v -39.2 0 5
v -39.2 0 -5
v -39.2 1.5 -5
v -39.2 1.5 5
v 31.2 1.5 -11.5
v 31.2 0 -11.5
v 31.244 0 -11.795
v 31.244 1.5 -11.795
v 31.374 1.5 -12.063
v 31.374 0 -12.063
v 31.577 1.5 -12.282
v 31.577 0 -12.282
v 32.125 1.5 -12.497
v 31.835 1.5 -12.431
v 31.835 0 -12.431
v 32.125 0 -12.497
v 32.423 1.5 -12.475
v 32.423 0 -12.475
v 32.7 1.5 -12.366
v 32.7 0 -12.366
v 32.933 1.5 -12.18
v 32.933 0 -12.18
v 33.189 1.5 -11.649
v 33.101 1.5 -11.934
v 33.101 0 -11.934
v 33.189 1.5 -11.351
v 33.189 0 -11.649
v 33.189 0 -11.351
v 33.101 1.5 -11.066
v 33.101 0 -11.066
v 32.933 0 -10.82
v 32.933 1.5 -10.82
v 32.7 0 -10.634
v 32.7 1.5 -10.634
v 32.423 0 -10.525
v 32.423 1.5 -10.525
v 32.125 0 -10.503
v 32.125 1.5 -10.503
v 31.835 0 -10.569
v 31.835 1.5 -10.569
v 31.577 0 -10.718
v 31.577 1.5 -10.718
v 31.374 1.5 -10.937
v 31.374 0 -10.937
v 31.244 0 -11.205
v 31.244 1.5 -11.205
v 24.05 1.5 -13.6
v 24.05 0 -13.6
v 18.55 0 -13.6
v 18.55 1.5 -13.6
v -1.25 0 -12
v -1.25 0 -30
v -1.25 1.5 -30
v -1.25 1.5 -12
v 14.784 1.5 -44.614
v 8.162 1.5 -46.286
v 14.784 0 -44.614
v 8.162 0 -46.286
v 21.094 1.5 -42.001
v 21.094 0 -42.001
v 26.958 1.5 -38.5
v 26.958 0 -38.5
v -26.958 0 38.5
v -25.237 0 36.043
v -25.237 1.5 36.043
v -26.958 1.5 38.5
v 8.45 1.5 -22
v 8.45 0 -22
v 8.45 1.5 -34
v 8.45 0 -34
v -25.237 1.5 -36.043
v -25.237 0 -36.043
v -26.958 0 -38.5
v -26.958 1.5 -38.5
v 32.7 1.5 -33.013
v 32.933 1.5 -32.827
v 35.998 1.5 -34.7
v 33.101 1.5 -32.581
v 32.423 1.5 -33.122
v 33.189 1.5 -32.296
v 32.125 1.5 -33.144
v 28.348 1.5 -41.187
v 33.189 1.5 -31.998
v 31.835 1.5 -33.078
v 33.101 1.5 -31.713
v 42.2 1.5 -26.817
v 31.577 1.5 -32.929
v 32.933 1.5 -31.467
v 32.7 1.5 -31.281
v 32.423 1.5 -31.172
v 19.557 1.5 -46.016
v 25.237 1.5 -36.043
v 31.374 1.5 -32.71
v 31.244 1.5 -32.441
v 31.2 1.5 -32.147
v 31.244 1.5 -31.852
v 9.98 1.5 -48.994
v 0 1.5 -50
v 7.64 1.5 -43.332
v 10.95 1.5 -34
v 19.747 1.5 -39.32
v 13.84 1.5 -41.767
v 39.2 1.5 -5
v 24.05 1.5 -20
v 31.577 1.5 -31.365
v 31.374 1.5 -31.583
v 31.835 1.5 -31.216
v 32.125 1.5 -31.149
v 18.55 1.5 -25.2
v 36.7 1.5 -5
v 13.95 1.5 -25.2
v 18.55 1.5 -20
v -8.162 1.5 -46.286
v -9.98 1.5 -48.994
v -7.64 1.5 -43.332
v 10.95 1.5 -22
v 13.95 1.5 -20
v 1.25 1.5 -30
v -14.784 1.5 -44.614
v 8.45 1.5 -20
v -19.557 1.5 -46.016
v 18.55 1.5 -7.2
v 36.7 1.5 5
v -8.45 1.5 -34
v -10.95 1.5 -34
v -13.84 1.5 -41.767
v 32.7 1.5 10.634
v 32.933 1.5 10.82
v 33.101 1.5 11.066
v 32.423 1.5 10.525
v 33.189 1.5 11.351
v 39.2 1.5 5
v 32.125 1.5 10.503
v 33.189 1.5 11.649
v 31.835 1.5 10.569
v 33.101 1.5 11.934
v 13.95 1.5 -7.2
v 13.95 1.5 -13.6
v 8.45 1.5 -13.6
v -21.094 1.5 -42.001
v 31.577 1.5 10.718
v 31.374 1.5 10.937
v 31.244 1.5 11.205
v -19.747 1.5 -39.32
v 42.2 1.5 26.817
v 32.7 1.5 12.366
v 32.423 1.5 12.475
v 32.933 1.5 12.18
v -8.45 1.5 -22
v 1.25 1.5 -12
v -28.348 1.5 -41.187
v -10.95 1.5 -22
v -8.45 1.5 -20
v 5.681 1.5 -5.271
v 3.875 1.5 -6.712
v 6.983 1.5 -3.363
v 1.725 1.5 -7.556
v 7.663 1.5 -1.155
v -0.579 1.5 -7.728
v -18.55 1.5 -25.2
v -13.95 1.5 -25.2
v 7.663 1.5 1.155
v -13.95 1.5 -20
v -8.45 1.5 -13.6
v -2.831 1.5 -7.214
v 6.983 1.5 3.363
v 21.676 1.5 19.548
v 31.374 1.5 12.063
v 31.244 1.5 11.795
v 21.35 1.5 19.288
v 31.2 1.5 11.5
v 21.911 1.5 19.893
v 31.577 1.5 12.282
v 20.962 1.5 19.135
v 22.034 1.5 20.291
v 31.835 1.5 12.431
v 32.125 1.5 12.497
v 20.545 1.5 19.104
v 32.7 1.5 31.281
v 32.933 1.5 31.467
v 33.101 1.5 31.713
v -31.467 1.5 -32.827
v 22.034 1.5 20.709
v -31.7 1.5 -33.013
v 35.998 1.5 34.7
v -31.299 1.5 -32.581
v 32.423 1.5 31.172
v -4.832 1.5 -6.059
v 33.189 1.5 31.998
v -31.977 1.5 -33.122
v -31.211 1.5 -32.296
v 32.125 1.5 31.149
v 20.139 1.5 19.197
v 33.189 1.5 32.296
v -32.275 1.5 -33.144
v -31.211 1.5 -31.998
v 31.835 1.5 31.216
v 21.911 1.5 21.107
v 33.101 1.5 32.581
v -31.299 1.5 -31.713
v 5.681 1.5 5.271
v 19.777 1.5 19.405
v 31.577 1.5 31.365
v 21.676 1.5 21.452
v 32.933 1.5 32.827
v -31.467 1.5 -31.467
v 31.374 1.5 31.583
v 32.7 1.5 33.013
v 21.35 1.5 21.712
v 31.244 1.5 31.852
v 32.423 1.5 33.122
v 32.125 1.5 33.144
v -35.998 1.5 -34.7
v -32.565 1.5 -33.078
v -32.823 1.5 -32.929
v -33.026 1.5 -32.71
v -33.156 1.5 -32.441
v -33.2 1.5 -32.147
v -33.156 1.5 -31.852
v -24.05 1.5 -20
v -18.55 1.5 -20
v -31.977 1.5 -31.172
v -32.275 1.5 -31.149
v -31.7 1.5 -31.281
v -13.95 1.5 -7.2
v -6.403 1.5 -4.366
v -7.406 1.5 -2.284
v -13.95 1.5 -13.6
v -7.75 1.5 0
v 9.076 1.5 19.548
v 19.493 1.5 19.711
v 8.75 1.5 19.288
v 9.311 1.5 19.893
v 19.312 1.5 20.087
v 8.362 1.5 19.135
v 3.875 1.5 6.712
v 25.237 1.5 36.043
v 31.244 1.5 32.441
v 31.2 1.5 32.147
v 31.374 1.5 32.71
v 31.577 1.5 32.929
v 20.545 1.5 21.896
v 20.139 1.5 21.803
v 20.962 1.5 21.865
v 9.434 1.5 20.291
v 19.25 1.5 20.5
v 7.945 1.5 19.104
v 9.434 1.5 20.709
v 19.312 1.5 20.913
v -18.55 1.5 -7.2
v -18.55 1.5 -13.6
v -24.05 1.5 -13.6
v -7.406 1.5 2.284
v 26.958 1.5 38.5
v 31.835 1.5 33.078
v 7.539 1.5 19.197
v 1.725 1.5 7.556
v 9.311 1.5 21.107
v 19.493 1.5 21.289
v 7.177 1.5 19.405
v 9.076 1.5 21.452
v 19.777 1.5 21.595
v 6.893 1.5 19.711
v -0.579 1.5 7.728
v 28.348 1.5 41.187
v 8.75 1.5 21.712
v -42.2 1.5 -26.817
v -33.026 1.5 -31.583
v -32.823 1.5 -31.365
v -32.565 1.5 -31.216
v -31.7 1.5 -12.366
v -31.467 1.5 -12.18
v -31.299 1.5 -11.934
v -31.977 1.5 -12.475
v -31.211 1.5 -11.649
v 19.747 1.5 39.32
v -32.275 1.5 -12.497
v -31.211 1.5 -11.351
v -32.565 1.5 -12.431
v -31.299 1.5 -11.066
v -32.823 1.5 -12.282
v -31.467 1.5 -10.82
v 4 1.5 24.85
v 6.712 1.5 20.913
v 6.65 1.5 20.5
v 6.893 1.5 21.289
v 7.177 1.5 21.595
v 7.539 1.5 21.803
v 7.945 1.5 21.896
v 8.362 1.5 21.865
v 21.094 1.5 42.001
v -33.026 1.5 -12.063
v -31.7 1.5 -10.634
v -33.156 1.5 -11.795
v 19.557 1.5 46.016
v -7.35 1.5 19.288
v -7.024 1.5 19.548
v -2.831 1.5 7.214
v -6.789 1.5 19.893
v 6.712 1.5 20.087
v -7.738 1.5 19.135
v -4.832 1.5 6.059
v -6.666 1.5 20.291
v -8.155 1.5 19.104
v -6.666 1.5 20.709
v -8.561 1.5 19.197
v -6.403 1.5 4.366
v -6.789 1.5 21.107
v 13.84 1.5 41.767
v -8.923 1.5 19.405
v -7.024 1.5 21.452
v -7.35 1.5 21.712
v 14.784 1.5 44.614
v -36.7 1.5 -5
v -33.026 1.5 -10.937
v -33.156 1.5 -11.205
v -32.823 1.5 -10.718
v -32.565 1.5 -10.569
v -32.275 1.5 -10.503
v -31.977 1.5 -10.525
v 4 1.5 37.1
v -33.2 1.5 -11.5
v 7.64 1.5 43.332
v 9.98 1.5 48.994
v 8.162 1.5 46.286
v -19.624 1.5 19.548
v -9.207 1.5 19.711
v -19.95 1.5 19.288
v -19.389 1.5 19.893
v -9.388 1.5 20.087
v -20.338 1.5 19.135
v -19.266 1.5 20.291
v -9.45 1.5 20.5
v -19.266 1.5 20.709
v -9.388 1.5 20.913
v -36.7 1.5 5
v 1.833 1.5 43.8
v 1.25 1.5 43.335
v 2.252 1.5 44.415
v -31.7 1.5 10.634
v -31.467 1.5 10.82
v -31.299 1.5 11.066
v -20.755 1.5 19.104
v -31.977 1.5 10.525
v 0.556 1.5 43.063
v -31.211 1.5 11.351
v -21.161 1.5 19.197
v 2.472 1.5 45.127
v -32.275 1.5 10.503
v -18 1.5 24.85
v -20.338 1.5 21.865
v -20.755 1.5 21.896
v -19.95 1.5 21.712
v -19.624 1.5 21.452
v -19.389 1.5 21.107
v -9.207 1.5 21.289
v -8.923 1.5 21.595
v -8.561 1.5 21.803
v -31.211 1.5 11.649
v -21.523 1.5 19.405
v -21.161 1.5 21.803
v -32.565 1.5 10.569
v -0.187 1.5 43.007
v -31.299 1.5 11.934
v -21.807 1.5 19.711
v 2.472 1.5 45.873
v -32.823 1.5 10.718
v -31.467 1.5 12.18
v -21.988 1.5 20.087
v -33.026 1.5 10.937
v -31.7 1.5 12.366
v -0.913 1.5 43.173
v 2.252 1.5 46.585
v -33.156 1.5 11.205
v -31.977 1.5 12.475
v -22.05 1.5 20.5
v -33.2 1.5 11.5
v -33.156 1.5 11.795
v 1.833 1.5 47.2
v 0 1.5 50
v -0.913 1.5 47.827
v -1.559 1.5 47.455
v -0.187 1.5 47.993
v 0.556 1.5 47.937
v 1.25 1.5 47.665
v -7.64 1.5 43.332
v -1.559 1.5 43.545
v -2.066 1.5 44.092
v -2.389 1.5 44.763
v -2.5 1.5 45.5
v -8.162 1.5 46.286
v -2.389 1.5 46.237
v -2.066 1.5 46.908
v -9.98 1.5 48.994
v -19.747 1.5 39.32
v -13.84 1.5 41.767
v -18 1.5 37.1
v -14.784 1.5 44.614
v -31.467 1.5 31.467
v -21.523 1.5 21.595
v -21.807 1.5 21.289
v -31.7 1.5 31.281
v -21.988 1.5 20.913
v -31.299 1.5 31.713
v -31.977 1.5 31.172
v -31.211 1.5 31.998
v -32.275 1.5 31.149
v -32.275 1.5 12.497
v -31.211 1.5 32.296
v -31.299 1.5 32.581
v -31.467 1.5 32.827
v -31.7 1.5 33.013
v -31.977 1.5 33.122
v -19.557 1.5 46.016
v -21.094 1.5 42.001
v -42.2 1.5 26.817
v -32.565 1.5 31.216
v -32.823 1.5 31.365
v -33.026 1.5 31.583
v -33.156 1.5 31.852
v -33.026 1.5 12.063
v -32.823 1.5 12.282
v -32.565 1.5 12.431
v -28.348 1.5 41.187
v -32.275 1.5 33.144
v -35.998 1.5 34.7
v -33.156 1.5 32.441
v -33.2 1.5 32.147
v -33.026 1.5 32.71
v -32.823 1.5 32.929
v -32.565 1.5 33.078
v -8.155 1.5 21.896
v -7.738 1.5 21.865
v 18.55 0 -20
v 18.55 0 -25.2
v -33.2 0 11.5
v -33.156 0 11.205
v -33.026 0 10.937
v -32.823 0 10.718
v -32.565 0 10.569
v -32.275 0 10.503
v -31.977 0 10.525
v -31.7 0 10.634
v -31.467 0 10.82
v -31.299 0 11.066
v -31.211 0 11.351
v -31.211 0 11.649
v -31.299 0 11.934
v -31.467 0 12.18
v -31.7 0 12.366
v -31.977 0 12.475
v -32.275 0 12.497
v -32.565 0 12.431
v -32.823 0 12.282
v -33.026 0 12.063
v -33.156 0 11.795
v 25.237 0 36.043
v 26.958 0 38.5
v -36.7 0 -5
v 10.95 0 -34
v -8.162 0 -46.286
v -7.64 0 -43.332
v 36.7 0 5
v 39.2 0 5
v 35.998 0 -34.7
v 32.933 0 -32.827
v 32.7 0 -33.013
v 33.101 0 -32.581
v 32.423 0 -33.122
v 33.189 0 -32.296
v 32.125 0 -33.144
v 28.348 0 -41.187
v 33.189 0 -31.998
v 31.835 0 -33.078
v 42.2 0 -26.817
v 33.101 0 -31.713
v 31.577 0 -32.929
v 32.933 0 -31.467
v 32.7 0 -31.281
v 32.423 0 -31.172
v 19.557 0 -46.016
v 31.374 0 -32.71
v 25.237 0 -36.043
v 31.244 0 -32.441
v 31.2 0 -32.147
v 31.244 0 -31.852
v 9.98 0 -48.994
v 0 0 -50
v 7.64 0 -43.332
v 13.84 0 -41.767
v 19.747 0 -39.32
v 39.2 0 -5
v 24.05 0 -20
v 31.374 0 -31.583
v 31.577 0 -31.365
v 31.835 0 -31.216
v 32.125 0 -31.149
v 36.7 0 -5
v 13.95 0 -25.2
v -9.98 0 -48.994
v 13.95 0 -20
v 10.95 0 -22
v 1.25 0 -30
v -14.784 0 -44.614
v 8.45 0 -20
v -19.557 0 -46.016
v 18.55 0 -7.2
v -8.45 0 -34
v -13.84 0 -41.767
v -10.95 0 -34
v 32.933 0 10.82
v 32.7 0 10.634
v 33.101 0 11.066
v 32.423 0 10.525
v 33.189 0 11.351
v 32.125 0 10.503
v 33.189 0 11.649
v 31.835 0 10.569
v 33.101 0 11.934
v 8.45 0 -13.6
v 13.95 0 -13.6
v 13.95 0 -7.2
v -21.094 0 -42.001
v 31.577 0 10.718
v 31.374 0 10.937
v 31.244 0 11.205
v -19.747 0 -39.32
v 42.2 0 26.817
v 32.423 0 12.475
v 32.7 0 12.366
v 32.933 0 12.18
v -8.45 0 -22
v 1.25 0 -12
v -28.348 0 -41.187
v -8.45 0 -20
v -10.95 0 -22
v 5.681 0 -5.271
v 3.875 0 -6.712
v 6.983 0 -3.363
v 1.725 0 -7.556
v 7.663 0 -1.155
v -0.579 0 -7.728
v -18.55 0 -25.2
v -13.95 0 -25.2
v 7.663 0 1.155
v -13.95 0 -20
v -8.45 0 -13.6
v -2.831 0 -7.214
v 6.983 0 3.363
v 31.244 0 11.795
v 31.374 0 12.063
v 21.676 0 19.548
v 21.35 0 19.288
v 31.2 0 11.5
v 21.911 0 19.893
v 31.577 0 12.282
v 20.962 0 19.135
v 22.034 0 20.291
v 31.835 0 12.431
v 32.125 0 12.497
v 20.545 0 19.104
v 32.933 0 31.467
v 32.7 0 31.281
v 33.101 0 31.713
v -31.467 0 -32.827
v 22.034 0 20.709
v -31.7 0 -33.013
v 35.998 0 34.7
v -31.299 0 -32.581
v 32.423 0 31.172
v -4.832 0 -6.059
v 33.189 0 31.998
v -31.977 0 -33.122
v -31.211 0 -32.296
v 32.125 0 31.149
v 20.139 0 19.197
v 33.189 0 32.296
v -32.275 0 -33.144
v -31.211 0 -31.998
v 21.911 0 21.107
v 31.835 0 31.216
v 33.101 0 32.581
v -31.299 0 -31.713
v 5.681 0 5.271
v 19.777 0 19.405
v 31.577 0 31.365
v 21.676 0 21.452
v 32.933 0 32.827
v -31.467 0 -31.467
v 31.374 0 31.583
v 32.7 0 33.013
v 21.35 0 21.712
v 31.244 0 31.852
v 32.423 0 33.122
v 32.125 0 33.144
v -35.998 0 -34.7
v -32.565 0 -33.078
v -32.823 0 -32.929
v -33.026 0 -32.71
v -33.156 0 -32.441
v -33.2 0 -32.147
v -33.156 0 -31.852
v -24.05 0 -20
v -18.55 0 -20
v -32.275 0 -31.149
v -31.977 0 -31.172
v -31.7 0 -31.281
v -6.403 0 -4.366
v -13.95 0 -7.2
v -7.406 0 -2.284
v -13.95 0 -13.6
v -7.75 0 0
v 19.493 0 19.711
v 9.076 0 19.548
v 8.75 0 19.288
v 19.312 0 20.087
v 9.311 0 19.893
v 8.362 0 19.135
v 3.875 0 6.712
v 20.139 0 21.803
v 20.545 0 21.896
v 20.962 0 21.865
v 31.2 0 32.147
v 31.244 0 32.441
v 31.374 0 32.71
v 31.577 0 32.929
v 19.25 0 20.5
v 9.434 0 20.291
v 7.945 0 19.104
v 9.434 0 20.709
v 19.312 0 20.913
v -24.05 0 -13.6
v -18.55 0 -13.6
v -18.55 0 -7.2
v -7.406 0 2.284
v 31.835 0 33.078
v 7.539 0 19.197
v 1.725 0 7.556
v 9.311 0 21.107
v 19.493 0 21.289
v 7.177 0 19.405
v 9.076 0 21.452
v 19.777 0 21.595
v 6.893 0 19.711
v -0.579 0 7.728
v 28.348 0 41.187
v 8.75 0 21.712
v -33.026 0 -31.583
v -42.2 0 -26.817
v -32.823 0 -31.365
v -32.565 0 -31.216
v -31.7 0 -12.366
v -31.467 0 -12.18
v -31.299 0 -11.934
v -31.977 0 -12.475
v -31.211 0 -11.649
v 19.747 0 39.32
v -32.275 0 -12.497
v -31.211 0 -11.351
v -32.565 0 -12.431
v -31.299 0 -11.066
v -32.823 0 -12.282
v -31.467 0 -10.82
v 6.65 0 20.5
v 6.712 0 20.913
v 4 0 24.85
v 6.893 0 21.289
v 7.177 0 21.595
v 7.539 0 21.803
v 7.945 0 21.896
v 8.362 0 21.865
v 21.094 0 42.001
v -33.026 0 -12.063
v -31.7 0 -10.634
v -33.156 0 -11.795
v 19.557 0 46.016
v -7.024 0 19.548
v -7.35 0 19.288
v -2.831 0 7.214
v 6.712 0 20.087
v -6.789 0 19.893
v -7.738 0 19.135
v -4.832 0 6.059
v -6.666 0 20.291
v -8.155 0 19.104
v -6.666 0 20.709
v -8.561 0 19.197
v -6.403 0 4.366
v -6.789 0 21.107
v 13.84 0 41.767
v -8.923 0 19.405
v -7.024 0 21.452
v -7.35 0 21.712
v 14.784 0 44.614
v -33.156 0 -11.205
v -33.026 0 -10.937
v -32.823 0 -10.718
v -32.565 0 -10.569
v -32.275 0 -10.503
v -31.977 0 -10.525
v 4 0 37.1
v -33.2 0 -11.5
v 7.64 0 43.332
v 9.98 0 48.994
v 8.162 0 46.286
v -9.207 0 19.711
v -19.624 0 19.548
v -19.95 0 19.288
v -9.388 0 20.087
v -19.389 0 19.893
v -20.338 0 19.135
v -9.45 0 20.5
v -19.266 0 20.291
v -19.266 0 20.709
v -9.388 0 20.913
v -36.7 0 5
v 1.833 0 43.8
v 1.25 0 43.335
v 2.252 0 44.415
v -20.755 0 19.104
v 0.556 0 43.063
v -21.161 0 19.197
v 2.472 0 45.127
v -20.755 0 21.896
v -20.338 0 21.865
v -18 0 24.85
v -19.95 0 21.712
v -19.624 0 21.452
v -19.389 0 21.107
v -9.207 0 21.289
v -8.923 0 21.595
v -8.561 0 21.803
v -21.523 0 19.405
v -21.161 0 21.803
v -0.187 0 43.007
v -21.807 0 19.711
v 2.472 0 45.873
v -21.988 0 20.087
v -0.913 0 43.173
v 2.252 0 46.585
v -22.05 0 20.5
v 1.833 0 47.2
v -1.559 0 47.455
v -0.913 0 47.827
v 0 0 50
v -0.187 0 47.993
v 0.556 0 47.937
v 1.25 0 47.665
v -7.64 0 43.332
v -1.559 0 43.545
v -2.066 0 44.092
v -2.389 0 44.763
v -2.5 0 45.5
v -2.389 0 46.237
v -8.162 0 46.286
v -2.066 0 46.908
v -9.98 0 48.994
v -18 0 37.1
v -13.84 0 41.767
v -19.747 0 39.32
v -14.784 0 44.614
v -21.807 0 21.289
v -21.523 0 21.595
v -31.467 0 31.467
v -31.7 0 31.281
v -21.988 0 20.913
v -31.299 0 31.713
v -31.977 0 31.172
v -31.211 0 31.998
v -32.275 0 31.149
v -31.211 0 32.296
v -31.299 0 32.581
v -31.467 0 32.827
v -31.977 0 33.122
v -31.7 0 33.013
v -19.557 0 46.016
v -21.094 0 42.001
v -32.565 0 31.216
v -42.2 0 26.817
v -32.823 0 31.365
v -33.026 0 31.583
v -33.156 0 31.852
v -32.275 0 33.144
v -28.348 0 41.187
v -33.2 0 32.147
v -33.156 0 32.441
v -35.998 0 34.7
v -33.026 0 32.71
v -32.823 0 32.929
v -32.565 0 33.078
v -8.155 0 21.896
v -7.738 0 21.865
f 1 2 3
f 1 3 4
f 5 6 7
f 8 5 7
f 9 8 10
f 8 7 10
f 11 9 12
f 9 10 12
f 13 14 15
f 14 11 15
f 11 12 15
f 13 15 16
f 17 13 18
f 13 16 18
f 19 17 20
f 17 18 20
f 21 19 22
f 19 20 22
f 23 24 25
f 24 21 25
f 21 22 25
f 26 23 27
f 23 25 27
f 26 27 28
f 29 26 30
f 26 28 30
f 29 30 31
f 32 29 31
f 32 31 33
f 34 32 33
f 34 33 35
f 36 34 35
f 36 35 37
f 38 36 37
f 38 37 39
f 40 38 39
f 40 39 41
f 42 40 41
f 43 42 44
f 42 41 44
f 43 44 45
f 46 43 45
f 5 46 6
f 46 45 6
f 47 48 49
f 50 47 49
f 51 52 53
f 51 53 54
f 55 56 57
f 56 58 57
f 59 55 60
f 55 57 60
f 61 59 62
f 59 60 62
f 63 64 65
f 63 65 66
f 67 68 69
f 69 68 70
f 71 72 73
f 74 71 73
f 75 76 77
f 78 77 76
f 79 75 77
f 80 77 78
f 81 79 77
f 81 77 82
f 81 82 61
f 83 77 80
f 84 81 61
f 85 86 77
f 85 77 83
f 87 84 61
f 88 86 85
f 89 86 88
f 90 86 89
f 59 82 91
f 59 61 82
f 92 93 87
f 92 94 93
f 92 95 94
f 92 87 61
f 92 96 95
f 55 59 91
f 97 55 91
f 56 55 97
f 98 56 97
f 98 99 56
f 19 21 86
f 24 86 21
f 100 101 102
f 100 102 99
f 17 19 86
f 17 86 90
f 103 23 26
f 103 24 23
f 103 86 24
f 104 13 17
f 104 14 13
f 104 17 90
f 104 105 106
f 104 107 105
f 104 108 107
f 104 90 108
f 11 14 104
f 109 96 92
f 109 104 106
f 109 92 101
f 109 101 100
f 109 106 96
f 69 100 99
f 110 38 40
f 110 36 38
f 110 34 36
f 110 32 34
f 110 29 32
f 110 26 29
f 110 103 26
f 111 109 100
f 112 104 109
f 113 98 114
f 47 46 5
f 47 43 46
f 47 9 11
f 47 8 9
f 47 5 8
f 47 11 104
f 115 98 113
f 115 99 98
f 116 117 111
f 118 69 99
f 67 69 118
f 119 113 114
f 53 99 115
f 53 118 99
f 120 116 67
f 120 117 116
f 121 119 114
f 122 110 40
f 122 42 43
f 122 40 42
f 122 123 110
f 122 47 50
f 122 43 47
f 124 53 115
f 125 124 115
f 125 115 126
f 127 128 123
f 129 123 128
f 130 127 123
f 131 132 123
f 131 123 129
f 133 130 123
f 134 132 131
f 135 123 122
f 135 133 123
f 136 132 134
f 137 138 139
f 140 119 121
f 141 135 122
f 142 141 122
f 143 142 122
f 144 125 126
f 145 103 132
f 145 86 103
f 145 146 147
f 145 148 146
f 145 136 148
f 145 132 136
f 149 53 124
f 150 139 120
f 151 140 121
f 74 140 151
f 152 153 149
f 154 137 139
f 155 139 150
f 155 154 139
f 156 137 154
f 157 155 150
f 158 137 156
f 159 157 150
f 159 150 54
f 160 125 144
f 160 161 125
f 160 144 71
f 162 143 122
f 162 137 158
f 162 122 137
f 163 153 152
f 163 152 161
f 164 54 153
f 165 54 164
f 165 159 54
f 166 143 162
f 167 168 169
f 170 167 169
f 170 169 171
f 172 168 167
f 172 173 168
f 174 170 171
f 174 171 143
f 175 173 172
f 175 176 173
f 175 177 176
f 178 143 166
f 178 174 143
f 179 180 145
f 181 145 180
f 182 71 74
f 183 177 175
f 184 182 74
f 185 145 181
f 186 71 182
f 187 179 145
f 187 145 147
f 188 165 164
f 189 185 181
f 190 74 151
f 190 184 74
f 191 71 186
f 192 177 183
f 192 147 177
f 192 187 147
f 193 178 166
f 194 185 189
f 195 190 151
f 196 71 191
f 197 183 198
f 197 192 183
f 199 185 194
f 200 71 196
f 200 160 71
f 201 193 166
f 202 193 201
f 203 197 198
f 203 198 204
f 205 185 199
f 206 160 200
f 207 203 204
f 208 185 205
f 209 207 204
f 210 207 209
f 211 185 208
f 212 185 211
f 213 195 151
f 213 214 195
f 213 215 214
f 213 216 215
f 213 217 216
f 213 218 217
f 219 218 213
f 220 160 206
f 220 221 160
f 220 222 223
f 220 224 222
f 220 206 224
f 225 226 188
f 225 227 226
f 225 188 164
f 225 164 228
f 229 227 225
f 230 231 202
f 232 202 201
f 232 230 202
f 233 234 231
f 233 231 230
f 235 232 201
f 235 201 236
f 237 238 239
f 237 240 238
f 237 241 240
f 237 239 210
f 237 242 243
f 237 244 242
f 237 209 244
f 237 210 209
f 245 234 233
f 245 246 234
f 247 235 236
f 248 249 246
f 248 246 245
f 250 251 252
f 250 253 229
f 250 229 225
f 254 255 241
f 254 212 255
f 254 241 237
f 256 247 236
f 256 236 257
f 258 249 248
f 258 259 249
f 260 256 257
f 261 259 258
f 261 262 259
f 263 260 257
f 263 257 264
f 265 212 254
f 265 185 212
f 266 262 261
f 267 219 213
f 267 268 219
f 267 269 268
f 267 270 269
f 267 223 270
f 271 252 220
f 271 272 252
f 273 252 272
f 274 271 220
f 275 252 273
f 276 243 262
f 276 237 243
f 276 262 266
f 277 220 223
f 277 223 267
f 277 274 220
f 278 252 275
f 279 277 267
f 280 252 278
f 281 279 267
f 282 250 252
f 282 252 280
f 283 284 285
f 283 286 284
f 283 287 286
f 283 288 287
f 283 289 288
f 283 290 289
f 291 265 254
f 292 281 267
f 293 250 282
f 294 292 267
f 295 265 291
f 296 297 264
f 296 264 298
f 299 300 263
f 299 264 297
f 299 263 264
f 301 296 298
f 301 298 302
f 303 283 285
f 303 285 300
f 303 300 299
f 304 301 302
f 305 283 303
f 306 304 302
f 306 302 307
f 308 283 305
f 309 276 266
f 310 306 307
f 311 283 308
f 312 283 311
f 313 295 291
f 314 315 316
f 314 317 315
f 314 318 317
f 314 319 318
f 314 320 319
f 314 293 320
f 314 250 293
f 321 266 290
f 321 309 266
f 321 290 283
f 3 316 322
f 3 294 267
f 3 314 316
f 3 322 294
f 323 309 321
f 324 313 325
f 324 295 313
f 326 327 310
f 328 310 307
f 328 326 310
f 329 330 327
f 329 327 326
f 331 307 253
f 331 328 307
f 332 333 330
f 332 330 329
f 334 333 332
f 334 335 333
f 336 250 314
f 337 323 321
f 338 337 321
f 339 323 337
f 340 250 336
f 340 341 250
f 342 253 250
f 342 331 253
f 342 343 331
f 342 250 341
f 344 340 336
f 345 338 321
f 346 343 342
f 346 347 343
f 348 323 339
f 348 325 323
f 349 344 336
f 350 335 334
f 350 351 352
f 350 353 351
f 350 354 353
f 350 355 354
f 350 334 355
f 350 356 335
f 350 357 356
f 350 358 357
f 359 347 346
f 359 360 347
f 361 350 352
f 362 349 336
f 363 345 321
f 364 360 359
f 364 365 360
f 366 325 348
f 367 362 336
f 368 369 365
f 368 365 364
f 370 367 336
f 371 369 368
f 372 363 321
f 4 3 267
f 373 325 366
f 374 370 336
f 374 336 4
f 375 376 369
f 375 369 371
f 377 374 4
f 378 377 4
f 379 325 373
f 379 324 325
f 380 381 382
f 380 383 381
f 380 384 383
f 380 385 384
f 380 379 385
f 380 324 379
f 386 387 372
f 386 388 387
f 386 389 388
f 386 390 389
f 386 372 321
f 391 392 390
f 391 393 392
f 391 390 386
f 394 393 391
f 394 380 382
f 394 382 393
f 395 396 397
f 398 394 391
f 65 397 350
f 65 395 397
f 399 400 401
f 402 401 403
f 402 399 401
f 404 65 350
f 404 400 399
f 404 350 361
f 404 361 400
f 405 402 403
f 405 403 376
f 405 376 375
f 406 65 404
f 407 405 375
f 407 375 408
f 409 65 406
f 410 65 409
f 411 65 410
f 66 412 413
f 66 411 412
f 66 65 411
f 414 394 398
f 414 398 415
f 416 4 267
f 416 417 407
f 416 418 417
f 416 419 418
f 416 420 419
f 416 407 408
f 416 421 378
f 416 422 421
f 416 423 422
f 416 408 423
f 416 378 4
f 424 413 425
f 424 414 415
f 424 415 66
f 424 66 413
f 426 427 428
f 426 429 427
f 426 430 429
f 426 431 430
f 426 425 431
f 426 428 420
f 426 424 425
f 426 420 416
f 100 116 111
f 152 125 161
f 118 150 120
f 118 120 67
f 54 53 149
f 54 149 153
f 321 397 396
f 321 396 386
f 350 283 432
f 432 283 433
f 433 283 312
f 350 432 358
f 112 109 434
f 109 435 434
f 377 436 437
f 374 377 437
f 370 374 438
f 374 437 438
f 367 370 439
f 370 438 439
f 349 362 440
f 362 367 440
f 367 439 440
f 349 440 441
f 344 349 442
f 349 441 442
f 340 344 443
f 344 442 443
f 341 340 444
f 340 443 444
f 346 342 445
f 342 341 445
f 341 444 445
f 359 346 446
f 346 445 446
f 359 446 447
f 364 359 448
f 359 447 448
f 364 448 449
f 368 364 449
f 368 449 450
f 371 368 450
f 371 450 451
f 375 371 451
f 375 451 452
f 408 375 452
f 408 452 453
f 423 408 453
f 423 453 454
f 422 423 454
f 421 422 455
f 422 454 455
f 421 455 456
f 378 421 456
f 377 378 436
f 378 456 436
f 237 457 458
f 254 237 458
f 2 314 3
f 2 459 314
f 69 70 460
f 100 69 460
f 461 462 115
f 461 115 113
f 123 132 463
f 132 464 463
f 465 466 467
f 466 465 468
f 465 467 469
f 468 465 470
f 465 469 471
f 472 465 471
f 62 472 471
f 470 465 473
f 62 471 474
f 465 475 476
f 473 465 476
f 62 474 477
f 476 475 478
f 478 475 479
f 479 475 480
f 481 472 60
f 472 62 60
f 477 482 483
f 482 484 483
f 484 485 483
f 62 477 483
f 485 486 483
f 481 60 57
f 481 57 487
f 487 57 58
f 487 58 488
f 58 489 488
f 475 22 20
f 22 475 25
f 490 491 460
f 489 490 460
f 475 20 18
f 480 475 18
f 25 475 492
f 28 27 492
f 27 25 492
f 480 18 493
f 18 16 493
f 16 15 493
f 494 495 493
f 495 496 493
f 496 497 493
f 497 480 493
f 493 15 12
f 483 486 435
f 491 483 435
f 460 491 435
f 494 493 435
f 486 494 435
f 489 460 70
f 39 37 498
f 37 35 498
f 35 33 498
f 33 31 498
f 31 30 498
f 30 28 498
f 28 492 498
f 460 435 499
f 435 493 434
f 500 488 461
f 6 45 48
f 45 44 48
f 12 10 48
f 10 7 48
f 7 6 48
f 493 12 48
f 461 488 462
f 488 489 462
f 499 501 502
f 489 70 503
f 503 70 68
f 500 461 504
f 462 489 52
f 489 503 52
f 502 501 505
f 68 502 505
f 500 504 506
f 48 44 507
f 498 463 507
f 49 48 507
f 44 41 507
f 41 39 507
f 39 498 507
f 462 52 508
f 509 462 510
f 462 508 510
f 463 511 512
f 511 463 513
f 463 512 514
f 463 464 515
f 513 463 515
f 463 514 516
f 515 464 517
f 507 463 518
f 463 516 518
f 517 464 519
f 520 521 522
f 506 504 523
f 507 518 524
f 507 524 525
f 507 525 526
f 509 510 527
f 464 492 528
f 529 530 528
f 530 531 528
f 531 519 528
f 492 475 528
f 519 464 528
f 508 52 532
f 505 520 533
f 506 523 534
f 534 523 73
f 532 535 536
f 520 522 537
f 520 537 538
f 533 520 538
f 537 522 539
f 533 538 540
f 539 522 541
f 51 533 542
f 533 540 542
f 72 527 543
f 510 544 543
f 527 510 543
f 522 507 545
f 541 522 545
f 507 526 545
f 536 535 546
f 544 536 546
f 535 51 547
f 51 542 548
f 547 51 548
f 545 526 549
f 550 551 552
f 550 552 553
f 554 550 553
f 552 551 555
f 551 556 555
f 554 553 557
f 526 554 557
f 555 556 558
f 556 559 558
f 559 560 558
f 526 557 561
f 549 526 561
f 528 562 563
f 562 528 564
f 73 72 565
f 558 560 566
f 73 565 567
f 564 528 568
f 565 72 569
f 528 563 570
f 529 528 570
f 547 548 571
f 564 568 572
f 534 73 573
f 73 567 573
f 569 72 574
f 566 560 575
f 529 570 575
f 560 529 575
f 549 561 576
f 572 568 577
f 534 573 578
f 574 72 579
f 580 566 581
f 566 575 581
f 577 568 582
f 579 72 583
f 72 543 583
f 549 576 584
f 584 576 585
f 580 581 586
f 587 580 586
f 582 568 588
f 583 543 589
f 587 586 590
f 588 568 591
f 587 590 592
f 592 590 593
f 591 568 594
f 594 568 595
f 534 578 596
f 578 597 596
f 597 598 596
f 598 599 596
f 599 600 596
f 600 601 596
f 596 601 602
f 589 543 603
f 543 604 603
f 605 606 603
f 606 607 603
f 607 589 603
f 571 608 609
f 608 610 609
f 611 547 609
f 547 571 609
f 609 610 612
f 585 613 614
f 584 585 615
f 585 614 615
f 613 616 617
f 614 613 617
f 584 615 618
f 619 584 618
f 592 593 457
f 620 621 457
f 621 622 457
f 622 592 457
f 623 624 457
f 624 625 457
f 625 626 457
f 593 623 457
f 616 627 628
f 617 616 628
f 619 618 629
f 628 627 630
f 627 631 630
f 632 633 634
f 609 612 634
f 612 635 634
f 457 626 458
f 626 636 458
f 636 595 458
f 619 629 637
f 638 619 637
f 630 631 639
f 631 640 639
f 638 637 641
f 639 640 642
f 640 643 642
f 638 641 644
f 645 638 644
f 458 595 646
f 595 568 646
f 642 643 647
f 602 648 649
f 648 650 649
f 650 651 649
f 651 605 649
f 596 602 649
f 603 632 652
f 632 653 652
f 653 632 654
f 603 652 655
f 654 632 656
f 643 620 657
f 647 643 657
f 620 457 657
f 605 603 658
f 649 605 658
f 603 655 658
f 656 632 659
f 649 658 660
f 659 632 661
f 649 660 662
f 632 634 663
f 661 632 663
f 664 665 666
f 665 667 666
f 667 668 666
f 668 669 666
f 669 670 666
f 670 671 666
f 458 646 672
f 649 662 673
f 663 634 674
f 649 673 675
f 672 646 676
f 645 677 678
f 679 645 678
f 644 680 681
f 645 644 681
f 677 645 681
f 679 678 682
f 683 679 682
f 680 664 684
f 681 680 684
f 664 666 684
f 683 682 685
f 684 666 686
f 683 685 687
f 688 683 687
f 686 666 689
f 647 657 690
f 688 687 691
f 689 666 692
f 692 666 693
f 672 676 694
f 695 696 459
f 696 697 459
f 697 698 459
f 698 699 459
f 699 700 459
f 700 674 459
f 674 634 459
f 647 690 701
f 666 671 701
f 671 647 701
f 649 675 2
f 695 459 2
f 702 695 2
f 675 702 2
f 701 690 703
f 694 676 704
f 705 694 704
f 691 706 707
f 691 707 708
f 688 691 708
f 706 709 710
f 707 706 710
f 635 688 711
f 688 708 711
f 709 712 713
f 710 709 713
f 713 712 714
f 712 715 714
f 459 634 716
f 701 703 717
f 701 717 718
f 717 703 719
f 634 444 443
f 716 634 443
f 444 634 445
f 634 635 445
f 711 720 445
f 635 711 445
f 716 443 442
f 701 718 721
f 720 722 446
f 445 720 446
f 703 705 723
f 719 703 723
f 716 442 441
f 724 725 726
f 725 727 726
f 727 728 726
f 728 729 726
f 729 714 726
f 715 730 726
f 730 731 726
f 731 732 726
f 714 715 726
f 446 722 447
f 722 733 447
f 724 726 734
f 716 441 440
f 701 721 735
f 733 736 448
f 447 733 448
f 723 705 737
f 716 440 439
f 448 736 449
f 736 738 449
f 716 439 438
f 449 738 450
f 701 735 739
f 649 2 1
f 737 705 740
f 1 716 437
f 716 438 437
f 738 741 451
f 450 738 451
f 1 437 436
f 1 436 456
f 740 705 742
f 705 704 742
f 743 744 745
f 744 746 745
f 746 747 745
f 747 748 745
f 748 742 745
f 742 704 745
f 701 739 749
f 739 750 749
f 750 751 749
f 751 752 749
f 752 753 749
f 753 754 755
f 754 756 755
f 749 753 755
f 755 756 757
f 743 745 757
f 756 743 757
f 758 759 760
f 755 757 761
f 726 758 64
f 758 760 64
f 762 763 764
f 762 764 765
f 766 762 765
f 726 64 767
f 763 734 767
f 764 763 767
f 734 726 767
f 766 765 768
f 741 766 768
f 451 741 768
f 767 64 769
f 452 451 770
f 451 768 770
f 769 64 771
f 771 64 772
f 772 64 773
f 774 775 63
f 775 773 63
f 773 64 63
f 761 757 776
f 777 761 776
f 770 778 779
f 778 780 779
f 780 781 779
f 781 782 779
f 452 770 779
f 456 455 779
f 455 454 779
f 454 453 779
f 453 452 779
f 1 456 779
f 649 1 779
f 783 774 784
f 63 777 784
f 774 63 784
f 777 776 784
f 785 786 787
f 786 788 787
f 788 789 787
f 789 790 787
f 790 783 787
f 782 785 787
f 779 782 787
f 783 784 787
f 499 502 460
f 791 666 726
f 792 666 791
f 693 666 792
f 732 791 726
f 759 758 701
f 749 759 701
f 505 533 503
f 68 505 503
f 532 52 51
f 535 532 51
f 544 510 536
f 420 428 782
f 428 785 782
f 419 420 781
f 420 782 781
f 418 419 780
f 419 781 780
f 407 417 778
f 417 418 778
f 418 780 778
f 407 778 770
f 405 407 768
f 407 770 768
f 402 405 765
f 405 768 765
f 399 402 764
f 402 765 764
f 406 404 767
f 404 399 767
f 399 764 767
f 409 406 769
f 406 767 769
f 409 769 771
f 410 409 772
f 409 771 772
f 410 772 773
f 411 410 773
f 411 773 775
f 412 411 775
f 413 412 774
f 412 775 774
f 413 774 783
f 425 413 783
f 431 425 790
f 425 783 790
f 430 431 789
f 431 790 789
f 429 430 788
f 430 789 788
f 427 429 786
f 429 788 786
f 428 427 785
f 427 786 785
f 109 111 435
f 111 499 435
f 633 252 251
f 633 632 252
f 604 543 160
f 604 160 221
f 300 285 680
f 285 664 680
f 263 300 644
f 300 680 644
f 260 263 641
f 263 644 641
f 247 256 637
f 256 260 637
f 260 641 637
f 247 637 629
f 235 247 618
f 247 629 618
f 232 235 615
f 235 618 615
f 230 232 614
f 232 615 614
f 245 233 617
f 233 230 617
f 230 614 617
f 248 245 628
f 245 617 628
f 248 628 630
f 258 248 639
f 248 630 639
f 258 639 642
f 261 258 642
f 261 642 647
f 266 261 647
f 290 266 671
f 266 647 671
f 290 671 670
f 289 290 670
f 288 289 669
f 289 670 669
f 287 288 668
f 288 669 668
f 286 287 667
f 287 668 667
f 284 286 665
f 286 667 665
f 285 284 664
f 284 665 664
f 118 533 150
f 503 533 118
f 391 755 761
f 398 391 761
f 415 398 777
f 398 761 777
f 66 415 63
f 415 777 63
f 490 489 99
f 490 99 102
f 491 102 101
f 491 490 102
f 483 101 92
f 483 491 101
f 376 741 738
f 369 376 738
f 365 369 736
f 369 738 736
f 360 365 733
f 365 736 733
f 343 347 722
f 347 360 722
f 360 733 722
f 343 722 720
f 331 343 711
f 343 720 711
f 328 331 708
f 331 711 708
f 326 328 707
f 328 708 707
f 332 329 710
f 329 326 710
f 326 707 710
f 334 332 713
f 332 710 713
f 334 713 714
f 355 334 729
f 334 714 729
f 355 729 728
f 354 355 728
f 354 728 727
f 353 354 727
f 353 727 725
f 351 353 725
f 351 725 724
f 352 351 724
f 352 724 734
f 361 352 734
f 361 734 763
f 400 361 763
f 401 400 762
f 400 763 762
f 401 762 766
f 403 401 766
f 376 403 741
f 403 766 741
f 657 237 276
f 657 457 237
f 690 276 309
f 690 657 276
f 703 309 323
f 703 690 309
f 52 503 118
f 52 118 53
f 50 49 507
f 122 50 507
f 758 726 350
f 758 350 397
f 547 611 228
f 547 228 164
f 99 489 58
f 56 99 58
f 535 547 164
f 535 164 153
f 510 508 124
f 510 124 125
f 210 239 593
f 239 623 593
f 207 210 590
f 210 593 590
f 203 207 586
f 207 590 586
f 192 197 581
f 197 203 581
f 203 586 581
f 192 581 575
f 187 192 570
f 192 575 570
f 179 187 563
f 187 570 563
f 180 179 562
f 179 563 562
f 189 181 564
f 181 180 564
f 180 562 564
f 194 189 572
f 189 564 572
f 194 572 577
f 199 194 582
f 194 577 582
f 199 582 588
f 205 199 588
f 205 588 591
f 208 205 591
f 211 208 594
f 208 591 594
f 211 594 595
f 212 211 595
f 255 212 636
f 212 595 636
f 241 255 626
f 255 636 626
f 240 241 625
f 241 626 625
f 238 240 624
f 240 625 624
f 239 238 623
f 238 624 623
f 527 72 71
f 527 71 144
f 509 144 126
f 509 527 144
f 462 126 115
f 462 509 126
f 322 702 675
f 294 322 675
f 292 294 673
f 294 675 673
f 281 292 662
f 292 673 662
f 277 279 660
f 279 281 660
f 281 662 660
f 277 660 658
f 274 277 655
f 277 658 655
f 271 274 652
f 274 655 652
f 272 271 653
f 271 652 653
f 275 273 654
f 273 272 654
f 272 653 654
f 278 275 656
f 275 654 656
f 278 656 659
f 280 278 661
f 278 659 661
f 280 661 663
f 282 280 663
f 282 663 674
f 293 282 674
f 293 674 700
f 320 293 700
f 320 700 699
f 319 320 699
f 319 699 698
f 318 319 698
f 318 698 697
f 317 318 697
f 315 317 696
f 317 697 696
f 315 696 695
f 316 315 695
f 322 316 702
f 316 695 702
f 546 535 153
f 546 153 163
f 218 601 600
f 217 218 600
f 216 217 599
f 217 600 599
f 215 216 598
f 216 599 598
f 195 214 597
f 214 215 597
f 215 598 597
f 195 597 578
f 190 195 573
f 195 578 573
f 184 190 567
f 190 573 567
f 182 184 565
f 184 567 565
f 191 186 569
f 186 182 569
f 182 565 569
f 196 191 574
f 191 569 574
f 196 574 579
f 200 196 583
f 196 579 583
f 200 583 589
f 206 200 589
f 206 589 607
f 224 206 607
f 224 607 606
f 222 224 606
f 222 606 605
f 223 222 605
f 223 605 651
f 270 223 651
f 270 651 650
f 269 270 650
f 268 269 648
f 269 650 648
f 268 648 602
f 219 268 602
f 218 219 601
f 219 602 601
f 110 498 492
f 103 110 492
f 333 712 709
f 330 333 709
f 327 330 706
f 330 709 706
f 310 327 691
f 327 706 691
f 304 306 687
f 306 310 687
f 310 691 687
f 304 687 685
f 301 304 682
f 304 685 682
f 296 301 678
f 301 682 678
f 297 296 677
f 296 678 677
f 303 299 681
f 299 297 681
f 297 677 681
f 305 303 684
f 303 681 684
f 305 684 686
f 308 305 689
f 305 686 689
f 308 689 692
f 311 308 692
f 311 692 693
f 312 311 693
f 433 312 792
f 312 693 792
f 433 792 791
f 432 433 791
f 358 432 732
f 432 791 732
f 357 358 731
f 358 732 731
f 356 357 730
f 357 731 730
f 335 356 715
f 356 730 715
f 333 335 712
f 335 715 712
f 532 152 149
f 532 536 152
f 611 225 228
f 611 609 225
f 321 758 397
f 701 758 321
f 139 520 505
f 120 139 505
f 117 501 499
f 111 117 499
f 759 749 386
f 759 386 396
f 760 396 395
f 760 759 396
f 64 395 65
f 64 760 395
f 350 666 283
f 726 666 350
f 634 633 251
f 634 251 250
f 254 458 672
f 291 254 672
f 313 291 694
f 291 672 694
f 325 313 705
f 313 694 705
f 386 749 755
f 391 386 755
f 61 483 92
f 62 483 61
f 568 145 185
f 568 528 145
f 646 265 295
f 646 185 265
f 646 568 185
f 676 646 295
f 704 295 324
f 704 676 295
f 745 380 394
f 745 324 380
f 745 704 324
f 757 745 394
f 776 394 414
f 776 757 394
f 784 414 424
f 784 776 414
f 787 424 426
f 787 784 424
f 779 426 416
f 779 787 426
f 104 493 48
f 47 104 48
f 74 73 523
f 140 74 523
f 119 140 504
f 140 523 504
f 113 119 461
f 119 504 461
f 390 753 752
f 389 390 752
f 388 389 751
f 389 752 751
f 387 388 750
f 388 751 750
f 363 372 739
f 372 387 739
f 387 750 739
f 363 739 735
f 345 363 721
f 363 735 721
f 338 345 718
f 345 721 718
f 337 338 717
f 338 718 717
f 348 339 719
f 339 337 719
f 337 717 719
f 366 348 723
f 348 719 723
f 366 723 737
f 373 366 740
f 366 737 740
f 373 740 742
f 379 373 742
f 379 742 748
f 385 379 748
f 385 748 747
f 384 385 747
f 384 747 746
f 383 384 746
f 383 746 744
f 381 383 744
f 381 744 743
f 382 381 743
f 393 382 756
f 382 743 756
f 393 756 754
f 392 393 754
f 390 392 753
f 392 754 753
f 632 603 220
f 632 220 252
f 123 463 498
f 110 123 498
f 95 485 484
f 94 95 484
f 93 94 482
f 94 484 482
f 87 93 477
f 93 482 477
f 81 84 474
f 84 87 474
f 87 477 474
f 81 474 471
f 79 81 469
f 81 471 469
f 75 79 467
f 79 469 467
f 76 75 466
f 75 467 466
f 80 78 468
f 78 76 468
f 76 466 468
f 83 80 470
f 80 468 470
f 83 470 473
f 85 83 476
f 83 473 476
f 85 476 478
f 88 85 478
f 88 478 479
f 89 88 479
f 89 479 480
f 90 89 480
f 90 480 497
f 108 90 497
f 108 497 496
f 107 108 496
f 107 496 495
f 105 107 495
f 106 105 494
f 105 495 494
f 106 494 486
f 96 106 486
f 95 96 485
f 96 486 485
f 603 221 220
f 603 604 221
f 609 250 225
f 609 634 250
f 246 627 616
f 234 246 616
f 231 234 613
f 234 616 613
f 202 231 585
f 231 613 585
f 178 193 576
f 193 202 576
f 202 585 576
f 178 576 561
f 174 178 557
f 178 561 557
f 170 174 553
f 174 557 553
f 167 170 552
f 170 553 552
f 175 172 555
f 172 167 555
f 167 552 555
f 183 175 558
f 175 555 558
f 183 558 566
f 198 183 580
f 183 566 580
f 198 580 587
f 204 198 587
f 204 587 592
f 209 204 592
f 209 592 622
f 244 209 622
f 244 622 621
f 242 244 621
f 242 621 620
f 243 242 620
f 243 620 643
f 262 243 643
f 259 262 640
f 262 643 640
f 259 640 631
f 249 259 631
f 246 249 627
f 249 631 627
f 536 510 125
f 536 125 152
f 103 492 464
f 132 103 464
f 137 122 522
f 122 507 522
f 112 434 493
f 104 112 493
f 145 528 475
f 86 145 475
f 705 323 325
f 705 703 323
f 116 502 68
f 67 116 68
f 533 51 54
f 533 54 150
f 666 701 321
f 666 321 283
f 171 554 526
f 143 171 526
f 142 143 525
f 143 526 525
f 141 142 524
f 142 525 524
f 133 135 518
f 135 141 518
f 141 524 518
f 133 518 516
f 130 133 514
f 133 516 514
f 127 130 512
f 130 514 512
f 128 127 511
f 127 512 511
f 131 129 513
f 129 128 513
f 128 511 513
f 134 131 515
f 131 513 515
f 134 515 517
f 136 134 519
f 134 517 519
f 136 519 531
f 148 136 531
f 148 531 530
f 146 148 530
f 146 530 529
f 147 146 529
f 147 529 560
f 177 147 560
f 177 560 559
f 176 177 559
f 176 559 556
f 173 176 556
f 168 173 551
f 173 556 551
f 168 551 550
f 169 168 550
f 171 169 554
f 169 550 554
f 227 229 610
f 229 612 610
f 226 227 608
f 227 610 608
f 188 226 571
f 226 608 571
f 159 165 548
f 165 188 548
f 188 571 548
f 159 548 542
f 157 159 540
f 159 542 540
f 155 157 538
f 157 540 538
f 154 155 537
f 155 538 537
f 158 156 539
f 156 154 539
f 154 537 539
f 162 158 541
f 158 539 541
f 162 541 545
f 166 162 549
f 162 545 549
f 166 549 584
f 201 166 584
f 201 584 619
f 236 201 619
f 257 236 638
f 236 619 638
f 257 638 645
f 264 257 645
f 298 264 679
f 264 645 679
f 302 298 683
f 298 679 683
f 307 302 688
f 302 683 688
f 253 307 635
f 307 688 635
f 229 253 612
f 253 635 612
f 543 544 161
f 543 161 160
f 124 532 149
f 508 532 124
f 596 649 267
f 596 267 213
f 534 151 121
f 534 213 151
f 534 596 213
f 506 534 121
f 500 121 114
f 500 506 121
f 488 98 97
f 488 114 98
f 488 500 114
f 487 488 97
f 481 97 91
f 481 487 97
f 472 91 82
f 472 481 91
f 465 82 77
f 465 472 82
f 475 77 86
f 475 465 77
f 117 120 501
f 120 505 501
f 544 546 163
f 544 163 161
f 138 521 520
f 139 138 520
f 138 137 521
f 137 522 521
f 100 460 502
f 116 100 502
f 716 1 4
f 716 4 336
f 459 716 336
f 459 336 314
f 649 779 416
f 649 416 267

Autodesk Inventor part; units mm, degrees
ref_plane "YZ Plane" through (0, 0, 0) normal (1, 0, 0) x (0, 1, 0)
ref_plane "XZ Plane" through (0, 0, 0) normal (0, 1, 0) x (-1, 0, 0)
ref_plane "XY Plane" through (0, 0, 0) normal (0, 0, 1) x (1, 0, 0)
sketch "Sketch1" plane through (0, 0, 0) normal (0, 1, 0) x (-1, 0, 0)
  line L0 (42.2, 26.8172) -> (42.2, -26.8172)
  line L1 (0, 0) -> (0, -50) construction
  line L2 (-42.2, 26.8172) -> (-42.2, -26.8172)
  arc A0 (42.2, 26.8172) -> (-42.2, 26.8172) centre (0, 0) ccw
  arc A1 (-42.2, -26.8172) -> (42.2, -26.8172) centre (0, 0) ccw
  line L3 (39.2, 5) -> (36.7, 5)
  line L4 (36.7, 5) -> (36.7, -5)
  line L5 (36.7, -5) -> (39.2, -5)
  line L6 (39.2, -5) -> (39.2, 5)
  circle A2 centre (0, 0) radius 7.75
  line L7 (1.25, -12) -> (-1.25, -12)
  line L8 (-1.25, -12) -> (-1.25, -30)
  line L9 (-1.25, -30) -> (1.25, -30)
  line L10 (1.25, -30) -> (1.25, -12)
  line L11 (10.95, -22) -> (8.45, -22)
  line L12 (8.45, -22) -> (8.45, -34)
  line L13 (8.45, -34) -> (10.95, -34)
  line L14 (10.95, -34) -> (10.95, -22)
  line L15 (8.45, -13.6) -> (8.45, -20)
  line L16 (24.05, -20) -> (24.05, -13.6)
  line L17 (18.55, -7.2) -> (13.95, -7.2)
  line L18 (13.95, -25.2) -> (18.55, -25.2)
  line L19 (18, 37.1) -> (-4, 37.1)
  line L20 (-4, 37.1) -> (-4, 24.85)
  line L21 (-4, 24.85) -> (18, 24.85)
  line L22 (18, 24.85) -> (18, 37.1)
  line L23 (25.2374, 36.0427) -> (26.9581, 38.5001)
  line L24 (0, 0) -> (7.6405, 43.3315) construction
  line L25 (7.6405, 43.3315) -> (8.1615, 46.286)
  line L26 (0, 0) -> (42.2, 0) construction
  line L27 (25.2374, -36.0427) -> (26.9581, -38.5001)
  line L28 (7.6405, -43.3315) -> (8.1615, -46.286)
  arc A3 (7.6405, -43.3315) -> (25.2374, -36.0427) centre (0, 0) ccw
  arc A4 (25.2374, 36.0427) -> (7.6405, 43.3315) centre (0, 0) ccw
  arc A5 (8.1615, -46.286) -> (26.9581, -38.5001) centre (0, 0) ccw
  arc A6 (26.9581, 38.5001) -> (8.1615, 46.286) centre (0, 0) ccw
  line L29 (0, 0) -> (25.2374, 36.0427) construction
  line L30 (16.25, -7.2) -> (16.25, -25.2) construction
  line L31 (18.55, -25.2) -> (18.55, -20)
  line L32 (18.55, -13.6) -> (18.55, -7.2)
  line L33 (24.05, -13.6) -> (18.55, -13.6)
  line L34 (13.95, -13.6) -> (8.45, -13.6)
  line L35 (13.95, -7.2) -> (13.95, -13.6)
  line L36 (13.95, -20) -> (13.95, -25.2)
  line L37 (8.45, -20) -> (13.95, -20)
  line L38 (18.55, -20) -> (24.05, -20)
  line L39 (-39.2, 5) -> (-36.7, 5)
  line L40 (-36.7, 5) -> (-36.7, -5)
  line L41 (-36.7, -5) -> (-39.2, -5)
  line L42 (-39.2, -5) -> (-39.2, 5)
  line L43 (-8.45, 16.1) -> (-8.45, 9.2)
  line L44 (-11.55, 9.2) -> (-11.55, 16.1)
  line L45 (-10.95, -22) -> (-8.45, -22)
  line L46 (-8.45, -22) -> (-8.45, -34)
  line L47 (-8.45, -34) -> (-10.95, -34)
  line L48 (-10.95, -34) -> (-10.95, -22)
  line L49 (-8.45, -13.6) -> (-8.45, -20)
  line L50 (-24.05, -20) -> (-24.05, -13.6)
  line L51 (-18.55, -7.2) -> (-13.95, -7.2)
  line L52 (-13.95, -25.2) -> (-18.55, -25.2)
  line L53 (-25.2374, 36.0427) -> (-26.9581, 38.5001)
  line L54 (-7.6405, 43.3315) -> (-8.1615, 46.286)
  line L55 (0, 0) -> (-42.2, 0) construction
  line L56 (-25.2374, -36.0427) -> (-26.9581, -38.5001)
  line L57 (-7.6405, -43.3315) -> (-8.1615, -46.286)
  arc A7 (-25.2374, -36.0427) -> (-7.6405, -43.3315) centre (0, 0) ccw
  arc A8 (-7.6405, 43.3315) -> (-25.2374, 36.0427) centre (0, 0) ccw
  arc A9 (-26.9581, -38.5001) -> (-8.1615, -46.286) centre (0, 0) ccw
  arc A10 (-8.1615, 46.286) -> (-26.9581, 38.5001) centre (0, 0) ccw
  line L58 (-18.55, -25.2) -> (-18.55, -20)
  line L59 (-18.55, -13.6) -> (-18.55, -7.2)
  line L60 (-24.05, -13.6) -> (-18.55, -13.6)
  line L61 (-13.95, -13.6) -> (-8.45, -13.6)
  line L62 (-13.95, -7.2) -> (-13.95, -13.6)
  line L63 (-13.95, -20) -> (-13.95, -25.2)
  line L64 (-8.45, -20) -> (-13.95, -20)
  line L65 (-18.55, -20) -> (-24.05, -20)
  circle A11 centre (0, 0) radius 45.5 construction
  circle A12 centre (32.2, -32.1467) radius 1
  circle A13 centre (32.2, 11.5) radius 1
  line L66 (11.95, 11.5) -> (32.2, 11.5) construction
  circle A14 centre (32.2, -11.5) radius 1
  circle A15 centre (32.2, 32.1467) radius 1
  circle A16 centre (-32.2, -32.1467) radius 1
  circle A17 centre (-32.2, 11.5) radius 1
  circle A18 centre (-32.2, -11.5) radius 1
  circle A19 centre (-32.2, 32.1467) radius 1
  arc A20 (-8.45, 16.1) -> (-11.55, 16.1) centre (-10, 16.1) ccw
  arc A21 (-11.55, 9.2) -> (-8.45, 9.2) centre (-10, 9.2) ccw
  arc A22 (-9.8689, 7.6556) -> (-8.45, 9.2) centre (-10, 9.2) ccw
  line L67 (11.55, 9.2) -> (11.55, 16.1)
  line L68 (8.45, 16.1) -> (8.45, 9.2)
  arc A23 (11.55, 16.1) -> (8.45, 16.1) centre (10, 16.1) ccw
  arc A24 (8.45, 9.2) -> (11.55, 9.2) centre (10, 9.2) ccw
  circle A25 centre (-8.05, 20.5) radius 1.4
  circle A26 centre (8.05, 20.5) radius 1.4
  circle A27 centre (-20.65, 20.5) radius 1.4
  circle A28 centre (20.65, 20.5) radius 1.4
  line L69 (-1.55, 11.2) -> (-1.55, 18.1)
  arc A29 (1.55, 18.1) -> (-1.55, 18.1) centre (0, 18.1) ccw
  line L70 (1.55, 18.1) -> (1.55, 11.2)
  arc A30 (-1.55, 11.2) -> (1.55, 11.2) centre (0, 11.2) ccw
  circle A31 centre (0, 45.5) radius 2.5
  line L71 (0, 45.5) -> (0, 50) construction
  line L72 (0, 50) -> (0, 45.5) construction
  point P0 (-16.25, -7.2)
  point P1 (26.0977, -37.2714)
  dimension "d1" = 42.2
  dimension "d2" = 50
  dimension "d5" = 10
  dimension "d6" = 35
  dimension "d7" = 44
  dimension "d8" = 47
  dimension "d9" = 10
  dimension "d10" = 3
  dimension "d11" = 2.5
  dimension "d12" = 15.5
  dimension "d13" = 12
  dimension "d14" = 18
  dimension "d15" = 1.25
  dimension "d20" = 12
  dimension "d21" = 10
  dimension "d22" = 12.25
  dimension "d23" = 4
  dimension "d24" = 22
  dimension "d26" = 4.6
  dimension "d27" = 6.4
  dimension "d28" = 18
  dimension "d30" = 5.5
  dimension "d39" = 10
  dimension "d40" = 2
  dimension "d47" = 20.25
  dimension "d52" = 2.8
  dimension "d55" = 12.6
  dimension "d57" = 20.5
  dimension "d58" = 3.1
  dimension "d59" = 6.9
  dimension "d60" = 3.1
  dimension "d61" = 11.2
  dimension "d62" = 13.1
  dimension "d63" = 16.1
  dimension "d64" = 2
  dimension "d65" = 6.5
  dimension "d66" = 24.85
  dimension "d67" = 5.2
  dimension "d68" = 25.2
  dimension "d69" = 5
extrude "Extrusion1" add sketch "Sketch1" along normal blind 1.5 contours L0 A1 L2 A0 | L43 A21 L44 A20 | A24 L68 A23 L67 | L69 A29 L70 A30
sketch "Sketch2" plane through (0, 1.5, 0) normal (0, 1, 0) x (1, 0, 0)
  line L0 (-24.05, 13.6) -> (-24.05, 20) construction
  line L1 (24.05, 13.6) -> (24.05, 20) construction
  line L2 (24.05, 16.8) -> (49.05, 16.8) construction
  line L3 (-24.05, 16.8) -> (-24.05, -20.5) construction
  line L4 (-24.05, -20.5) -> (-49.8842, -20.5) construction
  circle A0 centre (-20.65, -20.5) radius 1.4 projected
  line L5 (-24.05, 20) -> (-24.05, 13.6) projected
  line L6 (-24.05, 16.8) -> (-50.8471, 16.8) construction
  point P0 (0, 0)
properties part number "base_quick"
